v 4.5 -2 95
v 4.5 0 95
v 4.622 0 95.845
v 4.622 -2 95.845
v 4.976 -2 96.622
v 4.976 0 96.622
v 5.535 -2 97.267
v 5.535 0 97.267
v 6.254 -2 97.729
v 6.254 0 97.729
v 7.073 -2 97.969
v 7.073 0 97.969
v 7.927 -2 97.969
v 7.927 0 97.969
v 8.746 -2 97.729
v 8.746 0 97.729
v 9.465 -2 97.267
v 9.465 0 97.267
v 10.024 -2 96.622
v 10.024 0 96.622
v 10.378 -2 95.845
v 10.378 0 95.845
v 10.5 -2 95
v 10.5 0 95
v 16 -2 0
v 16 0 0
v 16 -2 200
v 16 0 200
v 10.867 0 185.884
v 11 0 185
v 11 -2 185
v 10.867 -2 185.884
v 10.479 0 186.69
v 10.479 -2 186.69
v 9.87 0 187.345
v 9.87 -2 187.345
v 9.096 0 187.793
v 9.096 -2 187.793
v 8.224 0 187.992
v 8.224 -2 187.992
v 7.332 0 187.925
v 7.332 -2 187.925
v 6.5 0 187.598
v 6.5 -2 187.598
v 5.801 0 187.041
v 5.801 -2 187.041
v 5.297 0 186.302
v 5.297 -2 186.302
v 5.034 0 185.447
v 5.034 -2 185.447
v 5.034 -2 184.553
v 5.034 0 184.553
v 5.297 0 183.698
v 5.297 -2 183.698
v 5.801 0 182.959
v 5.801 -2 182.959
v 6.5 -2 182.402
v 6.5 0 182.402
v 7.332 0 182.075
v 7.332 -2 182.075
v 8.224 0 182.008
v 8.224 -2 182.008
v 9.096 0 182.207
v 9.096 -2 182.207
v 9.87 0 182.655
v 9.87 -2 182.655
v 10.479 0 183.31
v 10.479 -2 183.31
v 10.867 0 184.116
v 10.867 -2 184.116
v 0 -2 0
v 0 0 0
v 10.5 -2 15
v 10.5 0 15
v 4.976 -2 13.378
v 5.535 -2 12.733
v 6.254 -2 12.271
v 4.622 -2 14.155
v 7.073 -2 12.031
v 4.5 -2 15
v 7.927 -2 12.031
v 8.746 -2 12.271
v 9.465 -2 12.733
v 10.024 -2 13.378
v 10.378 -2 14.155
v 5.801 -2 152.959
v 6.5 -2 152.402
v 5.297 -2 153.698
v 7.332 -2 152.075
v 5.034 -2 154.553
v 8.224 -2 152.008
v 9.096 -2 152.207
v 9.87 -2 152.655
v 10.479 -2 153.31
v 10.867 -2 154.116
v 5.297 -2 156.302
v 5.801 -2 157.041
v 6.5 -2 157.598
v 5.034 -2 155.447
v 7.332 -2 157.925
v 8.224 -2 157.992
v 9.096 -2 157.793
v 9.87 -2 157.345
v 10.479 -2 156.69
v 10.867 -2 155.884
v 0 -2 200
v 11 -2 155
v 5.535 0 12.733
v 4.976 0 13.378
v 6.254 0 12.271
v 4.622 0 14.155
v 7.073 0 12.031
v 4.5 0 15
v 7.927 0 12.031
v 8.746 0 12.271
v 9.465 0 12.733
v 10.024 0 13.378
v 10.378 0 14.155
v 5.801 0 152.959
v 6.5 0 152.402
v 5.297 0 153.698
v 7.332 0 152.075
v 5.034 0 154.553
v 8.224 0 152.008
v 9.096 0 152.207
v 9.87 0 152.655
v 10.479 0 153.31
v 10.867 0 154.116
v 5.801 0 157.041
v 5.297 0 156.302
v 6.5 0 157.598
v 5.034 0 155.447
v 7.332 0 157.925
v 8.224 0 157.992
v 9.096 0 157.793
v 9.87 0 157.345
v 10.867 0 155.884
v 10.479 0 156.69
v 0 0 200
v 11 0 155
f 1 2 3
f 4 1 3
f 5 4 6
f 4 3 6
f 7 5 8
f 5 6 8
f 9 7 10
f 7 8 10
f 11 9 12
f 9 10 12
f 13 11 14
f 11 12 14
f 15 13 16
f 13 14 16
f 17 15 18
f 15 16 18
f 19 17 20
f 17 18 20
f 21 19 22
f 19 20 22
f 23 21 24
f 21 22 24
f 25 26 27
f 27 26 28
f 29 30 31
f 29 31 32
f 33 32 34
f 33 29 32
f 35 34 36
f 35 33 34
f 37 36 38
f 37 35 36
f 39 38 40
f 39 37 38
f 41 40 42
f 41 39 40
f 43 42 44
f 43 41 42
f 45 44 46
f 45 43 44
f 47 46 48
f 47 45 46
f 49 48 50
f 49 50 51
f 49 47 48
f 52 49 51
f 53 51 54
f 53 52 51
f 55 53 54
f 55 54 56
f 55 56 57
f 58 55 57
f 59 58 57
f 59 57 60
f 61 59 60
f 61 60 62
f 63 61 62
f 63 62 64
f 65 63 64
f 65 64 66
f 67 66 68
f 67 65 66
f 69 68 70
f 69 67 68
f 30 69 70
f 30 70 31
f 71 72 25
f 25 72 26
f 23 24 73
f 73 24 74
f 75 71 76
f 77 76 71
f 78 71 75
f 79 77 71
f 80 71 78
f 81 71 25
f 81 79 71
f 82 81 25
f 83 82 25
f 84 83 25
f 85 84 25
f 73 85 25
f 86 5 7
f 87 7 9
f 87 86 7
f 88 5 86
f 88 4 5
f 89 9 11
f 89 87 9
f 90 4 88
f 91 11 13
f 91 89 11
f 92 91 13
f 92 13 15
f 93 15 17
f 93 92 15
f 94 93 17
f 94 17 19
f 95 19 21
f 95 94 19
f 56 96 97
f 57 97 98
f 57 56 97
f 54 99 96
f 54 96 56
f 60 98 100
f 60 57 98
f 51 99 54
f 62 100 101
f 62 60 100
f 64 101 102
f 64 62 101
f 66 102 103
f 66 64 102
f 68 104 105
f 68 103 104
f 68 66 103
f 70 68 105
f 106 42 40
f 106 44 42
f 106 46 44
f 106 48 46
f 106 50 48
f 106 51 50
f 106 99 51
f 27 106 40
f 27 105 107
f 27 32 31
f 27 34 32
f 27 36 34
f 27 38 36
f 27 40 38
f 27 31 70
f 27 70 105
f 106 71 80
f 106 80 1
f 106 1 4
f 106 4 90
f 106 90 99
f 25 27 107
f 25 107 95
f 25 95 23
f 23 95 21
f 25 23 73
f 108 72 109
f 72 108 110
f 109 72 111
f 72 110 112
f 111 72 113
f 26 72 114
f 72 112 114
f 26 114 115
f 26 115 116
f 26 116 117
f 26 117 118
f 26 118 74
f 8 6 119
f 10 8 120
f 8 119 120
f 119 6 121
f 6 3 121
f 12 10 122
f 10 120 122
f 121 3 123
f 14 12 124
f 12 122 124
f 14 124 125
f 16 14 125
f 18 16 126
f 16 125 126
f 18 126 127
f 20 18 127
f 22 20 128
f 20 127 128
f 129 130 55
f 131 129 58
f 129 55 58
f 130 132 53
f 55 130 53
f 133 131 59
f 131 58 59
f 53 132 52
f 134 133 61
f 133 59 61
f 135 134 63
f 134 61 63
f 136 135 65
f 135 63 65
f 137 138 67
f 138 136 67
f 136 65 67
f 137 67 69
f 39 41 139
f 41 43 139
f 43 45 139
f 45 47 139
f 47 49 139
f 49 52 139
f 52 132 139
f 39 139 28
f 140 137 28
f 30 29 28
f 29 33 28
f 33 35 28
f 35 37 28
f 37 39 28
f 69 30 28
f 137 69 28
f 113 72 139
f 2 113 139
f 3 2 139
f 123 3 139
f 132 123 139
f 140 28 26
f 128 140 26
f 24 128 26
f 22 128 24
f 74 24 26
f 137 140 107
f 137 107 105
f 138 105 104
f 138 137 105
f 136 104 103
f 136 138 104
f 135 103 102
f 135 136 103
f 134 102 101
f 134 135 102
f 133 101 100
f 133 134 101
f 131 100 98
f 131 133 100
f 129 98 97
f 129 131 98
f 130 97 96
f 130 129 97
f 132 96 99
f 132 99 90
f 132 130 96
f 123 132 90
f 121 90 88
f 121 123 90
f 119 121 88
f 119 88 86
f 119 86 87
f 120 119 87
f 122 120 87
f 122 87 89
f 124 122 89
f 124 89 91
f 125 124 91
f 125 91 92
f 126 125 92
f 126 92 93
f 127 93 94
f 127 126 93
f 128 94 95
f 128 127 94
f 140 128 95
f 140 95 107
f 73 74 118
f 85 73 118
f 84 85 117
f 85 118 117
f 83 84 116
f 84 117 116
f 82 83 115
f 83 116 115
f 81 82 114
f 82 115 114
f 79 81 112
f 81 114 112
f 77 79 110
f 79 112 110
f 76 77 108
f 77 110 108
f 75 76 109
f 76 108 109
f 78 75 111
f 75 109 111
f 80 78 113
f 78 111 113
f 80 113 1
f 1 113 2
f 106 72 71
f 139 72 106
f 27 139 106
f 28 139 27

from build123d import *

# Parameters (mm, degrees)
F0_W     = 16
F0_H     = 200
F0_R     = 3
F1_DEPTH = 2


with BuildPart() as f1:
    # F0 (on Front) → F1 (new body)
    with BuildSketch(Plane.XZ):
        with Locations((8, 100)):
            Rectangle(F0_W, F0_H)
        with BuildLine():
            Line((4.5, 15), (4.5, 95))
            ThreePointArc((4.5, 95), (7.5, 98), (10.5, 95))
            Line((10.5, 95), (10.5, 15))
            ThreePointArc((10.5, 15), (7.5, 12), (4.5, 15))
        make_face(mode=Mode.SUBTRACT)
        with Locations((8, 155)):
            Circle(F0_R, mode=Mode.SUBTRACT)
        with Locations((8, 185)):
            Circle(F0_R, mode=Mode.SUBTRACT)
    extrude(amount=F1_DEPTH)


solid = f1.part
